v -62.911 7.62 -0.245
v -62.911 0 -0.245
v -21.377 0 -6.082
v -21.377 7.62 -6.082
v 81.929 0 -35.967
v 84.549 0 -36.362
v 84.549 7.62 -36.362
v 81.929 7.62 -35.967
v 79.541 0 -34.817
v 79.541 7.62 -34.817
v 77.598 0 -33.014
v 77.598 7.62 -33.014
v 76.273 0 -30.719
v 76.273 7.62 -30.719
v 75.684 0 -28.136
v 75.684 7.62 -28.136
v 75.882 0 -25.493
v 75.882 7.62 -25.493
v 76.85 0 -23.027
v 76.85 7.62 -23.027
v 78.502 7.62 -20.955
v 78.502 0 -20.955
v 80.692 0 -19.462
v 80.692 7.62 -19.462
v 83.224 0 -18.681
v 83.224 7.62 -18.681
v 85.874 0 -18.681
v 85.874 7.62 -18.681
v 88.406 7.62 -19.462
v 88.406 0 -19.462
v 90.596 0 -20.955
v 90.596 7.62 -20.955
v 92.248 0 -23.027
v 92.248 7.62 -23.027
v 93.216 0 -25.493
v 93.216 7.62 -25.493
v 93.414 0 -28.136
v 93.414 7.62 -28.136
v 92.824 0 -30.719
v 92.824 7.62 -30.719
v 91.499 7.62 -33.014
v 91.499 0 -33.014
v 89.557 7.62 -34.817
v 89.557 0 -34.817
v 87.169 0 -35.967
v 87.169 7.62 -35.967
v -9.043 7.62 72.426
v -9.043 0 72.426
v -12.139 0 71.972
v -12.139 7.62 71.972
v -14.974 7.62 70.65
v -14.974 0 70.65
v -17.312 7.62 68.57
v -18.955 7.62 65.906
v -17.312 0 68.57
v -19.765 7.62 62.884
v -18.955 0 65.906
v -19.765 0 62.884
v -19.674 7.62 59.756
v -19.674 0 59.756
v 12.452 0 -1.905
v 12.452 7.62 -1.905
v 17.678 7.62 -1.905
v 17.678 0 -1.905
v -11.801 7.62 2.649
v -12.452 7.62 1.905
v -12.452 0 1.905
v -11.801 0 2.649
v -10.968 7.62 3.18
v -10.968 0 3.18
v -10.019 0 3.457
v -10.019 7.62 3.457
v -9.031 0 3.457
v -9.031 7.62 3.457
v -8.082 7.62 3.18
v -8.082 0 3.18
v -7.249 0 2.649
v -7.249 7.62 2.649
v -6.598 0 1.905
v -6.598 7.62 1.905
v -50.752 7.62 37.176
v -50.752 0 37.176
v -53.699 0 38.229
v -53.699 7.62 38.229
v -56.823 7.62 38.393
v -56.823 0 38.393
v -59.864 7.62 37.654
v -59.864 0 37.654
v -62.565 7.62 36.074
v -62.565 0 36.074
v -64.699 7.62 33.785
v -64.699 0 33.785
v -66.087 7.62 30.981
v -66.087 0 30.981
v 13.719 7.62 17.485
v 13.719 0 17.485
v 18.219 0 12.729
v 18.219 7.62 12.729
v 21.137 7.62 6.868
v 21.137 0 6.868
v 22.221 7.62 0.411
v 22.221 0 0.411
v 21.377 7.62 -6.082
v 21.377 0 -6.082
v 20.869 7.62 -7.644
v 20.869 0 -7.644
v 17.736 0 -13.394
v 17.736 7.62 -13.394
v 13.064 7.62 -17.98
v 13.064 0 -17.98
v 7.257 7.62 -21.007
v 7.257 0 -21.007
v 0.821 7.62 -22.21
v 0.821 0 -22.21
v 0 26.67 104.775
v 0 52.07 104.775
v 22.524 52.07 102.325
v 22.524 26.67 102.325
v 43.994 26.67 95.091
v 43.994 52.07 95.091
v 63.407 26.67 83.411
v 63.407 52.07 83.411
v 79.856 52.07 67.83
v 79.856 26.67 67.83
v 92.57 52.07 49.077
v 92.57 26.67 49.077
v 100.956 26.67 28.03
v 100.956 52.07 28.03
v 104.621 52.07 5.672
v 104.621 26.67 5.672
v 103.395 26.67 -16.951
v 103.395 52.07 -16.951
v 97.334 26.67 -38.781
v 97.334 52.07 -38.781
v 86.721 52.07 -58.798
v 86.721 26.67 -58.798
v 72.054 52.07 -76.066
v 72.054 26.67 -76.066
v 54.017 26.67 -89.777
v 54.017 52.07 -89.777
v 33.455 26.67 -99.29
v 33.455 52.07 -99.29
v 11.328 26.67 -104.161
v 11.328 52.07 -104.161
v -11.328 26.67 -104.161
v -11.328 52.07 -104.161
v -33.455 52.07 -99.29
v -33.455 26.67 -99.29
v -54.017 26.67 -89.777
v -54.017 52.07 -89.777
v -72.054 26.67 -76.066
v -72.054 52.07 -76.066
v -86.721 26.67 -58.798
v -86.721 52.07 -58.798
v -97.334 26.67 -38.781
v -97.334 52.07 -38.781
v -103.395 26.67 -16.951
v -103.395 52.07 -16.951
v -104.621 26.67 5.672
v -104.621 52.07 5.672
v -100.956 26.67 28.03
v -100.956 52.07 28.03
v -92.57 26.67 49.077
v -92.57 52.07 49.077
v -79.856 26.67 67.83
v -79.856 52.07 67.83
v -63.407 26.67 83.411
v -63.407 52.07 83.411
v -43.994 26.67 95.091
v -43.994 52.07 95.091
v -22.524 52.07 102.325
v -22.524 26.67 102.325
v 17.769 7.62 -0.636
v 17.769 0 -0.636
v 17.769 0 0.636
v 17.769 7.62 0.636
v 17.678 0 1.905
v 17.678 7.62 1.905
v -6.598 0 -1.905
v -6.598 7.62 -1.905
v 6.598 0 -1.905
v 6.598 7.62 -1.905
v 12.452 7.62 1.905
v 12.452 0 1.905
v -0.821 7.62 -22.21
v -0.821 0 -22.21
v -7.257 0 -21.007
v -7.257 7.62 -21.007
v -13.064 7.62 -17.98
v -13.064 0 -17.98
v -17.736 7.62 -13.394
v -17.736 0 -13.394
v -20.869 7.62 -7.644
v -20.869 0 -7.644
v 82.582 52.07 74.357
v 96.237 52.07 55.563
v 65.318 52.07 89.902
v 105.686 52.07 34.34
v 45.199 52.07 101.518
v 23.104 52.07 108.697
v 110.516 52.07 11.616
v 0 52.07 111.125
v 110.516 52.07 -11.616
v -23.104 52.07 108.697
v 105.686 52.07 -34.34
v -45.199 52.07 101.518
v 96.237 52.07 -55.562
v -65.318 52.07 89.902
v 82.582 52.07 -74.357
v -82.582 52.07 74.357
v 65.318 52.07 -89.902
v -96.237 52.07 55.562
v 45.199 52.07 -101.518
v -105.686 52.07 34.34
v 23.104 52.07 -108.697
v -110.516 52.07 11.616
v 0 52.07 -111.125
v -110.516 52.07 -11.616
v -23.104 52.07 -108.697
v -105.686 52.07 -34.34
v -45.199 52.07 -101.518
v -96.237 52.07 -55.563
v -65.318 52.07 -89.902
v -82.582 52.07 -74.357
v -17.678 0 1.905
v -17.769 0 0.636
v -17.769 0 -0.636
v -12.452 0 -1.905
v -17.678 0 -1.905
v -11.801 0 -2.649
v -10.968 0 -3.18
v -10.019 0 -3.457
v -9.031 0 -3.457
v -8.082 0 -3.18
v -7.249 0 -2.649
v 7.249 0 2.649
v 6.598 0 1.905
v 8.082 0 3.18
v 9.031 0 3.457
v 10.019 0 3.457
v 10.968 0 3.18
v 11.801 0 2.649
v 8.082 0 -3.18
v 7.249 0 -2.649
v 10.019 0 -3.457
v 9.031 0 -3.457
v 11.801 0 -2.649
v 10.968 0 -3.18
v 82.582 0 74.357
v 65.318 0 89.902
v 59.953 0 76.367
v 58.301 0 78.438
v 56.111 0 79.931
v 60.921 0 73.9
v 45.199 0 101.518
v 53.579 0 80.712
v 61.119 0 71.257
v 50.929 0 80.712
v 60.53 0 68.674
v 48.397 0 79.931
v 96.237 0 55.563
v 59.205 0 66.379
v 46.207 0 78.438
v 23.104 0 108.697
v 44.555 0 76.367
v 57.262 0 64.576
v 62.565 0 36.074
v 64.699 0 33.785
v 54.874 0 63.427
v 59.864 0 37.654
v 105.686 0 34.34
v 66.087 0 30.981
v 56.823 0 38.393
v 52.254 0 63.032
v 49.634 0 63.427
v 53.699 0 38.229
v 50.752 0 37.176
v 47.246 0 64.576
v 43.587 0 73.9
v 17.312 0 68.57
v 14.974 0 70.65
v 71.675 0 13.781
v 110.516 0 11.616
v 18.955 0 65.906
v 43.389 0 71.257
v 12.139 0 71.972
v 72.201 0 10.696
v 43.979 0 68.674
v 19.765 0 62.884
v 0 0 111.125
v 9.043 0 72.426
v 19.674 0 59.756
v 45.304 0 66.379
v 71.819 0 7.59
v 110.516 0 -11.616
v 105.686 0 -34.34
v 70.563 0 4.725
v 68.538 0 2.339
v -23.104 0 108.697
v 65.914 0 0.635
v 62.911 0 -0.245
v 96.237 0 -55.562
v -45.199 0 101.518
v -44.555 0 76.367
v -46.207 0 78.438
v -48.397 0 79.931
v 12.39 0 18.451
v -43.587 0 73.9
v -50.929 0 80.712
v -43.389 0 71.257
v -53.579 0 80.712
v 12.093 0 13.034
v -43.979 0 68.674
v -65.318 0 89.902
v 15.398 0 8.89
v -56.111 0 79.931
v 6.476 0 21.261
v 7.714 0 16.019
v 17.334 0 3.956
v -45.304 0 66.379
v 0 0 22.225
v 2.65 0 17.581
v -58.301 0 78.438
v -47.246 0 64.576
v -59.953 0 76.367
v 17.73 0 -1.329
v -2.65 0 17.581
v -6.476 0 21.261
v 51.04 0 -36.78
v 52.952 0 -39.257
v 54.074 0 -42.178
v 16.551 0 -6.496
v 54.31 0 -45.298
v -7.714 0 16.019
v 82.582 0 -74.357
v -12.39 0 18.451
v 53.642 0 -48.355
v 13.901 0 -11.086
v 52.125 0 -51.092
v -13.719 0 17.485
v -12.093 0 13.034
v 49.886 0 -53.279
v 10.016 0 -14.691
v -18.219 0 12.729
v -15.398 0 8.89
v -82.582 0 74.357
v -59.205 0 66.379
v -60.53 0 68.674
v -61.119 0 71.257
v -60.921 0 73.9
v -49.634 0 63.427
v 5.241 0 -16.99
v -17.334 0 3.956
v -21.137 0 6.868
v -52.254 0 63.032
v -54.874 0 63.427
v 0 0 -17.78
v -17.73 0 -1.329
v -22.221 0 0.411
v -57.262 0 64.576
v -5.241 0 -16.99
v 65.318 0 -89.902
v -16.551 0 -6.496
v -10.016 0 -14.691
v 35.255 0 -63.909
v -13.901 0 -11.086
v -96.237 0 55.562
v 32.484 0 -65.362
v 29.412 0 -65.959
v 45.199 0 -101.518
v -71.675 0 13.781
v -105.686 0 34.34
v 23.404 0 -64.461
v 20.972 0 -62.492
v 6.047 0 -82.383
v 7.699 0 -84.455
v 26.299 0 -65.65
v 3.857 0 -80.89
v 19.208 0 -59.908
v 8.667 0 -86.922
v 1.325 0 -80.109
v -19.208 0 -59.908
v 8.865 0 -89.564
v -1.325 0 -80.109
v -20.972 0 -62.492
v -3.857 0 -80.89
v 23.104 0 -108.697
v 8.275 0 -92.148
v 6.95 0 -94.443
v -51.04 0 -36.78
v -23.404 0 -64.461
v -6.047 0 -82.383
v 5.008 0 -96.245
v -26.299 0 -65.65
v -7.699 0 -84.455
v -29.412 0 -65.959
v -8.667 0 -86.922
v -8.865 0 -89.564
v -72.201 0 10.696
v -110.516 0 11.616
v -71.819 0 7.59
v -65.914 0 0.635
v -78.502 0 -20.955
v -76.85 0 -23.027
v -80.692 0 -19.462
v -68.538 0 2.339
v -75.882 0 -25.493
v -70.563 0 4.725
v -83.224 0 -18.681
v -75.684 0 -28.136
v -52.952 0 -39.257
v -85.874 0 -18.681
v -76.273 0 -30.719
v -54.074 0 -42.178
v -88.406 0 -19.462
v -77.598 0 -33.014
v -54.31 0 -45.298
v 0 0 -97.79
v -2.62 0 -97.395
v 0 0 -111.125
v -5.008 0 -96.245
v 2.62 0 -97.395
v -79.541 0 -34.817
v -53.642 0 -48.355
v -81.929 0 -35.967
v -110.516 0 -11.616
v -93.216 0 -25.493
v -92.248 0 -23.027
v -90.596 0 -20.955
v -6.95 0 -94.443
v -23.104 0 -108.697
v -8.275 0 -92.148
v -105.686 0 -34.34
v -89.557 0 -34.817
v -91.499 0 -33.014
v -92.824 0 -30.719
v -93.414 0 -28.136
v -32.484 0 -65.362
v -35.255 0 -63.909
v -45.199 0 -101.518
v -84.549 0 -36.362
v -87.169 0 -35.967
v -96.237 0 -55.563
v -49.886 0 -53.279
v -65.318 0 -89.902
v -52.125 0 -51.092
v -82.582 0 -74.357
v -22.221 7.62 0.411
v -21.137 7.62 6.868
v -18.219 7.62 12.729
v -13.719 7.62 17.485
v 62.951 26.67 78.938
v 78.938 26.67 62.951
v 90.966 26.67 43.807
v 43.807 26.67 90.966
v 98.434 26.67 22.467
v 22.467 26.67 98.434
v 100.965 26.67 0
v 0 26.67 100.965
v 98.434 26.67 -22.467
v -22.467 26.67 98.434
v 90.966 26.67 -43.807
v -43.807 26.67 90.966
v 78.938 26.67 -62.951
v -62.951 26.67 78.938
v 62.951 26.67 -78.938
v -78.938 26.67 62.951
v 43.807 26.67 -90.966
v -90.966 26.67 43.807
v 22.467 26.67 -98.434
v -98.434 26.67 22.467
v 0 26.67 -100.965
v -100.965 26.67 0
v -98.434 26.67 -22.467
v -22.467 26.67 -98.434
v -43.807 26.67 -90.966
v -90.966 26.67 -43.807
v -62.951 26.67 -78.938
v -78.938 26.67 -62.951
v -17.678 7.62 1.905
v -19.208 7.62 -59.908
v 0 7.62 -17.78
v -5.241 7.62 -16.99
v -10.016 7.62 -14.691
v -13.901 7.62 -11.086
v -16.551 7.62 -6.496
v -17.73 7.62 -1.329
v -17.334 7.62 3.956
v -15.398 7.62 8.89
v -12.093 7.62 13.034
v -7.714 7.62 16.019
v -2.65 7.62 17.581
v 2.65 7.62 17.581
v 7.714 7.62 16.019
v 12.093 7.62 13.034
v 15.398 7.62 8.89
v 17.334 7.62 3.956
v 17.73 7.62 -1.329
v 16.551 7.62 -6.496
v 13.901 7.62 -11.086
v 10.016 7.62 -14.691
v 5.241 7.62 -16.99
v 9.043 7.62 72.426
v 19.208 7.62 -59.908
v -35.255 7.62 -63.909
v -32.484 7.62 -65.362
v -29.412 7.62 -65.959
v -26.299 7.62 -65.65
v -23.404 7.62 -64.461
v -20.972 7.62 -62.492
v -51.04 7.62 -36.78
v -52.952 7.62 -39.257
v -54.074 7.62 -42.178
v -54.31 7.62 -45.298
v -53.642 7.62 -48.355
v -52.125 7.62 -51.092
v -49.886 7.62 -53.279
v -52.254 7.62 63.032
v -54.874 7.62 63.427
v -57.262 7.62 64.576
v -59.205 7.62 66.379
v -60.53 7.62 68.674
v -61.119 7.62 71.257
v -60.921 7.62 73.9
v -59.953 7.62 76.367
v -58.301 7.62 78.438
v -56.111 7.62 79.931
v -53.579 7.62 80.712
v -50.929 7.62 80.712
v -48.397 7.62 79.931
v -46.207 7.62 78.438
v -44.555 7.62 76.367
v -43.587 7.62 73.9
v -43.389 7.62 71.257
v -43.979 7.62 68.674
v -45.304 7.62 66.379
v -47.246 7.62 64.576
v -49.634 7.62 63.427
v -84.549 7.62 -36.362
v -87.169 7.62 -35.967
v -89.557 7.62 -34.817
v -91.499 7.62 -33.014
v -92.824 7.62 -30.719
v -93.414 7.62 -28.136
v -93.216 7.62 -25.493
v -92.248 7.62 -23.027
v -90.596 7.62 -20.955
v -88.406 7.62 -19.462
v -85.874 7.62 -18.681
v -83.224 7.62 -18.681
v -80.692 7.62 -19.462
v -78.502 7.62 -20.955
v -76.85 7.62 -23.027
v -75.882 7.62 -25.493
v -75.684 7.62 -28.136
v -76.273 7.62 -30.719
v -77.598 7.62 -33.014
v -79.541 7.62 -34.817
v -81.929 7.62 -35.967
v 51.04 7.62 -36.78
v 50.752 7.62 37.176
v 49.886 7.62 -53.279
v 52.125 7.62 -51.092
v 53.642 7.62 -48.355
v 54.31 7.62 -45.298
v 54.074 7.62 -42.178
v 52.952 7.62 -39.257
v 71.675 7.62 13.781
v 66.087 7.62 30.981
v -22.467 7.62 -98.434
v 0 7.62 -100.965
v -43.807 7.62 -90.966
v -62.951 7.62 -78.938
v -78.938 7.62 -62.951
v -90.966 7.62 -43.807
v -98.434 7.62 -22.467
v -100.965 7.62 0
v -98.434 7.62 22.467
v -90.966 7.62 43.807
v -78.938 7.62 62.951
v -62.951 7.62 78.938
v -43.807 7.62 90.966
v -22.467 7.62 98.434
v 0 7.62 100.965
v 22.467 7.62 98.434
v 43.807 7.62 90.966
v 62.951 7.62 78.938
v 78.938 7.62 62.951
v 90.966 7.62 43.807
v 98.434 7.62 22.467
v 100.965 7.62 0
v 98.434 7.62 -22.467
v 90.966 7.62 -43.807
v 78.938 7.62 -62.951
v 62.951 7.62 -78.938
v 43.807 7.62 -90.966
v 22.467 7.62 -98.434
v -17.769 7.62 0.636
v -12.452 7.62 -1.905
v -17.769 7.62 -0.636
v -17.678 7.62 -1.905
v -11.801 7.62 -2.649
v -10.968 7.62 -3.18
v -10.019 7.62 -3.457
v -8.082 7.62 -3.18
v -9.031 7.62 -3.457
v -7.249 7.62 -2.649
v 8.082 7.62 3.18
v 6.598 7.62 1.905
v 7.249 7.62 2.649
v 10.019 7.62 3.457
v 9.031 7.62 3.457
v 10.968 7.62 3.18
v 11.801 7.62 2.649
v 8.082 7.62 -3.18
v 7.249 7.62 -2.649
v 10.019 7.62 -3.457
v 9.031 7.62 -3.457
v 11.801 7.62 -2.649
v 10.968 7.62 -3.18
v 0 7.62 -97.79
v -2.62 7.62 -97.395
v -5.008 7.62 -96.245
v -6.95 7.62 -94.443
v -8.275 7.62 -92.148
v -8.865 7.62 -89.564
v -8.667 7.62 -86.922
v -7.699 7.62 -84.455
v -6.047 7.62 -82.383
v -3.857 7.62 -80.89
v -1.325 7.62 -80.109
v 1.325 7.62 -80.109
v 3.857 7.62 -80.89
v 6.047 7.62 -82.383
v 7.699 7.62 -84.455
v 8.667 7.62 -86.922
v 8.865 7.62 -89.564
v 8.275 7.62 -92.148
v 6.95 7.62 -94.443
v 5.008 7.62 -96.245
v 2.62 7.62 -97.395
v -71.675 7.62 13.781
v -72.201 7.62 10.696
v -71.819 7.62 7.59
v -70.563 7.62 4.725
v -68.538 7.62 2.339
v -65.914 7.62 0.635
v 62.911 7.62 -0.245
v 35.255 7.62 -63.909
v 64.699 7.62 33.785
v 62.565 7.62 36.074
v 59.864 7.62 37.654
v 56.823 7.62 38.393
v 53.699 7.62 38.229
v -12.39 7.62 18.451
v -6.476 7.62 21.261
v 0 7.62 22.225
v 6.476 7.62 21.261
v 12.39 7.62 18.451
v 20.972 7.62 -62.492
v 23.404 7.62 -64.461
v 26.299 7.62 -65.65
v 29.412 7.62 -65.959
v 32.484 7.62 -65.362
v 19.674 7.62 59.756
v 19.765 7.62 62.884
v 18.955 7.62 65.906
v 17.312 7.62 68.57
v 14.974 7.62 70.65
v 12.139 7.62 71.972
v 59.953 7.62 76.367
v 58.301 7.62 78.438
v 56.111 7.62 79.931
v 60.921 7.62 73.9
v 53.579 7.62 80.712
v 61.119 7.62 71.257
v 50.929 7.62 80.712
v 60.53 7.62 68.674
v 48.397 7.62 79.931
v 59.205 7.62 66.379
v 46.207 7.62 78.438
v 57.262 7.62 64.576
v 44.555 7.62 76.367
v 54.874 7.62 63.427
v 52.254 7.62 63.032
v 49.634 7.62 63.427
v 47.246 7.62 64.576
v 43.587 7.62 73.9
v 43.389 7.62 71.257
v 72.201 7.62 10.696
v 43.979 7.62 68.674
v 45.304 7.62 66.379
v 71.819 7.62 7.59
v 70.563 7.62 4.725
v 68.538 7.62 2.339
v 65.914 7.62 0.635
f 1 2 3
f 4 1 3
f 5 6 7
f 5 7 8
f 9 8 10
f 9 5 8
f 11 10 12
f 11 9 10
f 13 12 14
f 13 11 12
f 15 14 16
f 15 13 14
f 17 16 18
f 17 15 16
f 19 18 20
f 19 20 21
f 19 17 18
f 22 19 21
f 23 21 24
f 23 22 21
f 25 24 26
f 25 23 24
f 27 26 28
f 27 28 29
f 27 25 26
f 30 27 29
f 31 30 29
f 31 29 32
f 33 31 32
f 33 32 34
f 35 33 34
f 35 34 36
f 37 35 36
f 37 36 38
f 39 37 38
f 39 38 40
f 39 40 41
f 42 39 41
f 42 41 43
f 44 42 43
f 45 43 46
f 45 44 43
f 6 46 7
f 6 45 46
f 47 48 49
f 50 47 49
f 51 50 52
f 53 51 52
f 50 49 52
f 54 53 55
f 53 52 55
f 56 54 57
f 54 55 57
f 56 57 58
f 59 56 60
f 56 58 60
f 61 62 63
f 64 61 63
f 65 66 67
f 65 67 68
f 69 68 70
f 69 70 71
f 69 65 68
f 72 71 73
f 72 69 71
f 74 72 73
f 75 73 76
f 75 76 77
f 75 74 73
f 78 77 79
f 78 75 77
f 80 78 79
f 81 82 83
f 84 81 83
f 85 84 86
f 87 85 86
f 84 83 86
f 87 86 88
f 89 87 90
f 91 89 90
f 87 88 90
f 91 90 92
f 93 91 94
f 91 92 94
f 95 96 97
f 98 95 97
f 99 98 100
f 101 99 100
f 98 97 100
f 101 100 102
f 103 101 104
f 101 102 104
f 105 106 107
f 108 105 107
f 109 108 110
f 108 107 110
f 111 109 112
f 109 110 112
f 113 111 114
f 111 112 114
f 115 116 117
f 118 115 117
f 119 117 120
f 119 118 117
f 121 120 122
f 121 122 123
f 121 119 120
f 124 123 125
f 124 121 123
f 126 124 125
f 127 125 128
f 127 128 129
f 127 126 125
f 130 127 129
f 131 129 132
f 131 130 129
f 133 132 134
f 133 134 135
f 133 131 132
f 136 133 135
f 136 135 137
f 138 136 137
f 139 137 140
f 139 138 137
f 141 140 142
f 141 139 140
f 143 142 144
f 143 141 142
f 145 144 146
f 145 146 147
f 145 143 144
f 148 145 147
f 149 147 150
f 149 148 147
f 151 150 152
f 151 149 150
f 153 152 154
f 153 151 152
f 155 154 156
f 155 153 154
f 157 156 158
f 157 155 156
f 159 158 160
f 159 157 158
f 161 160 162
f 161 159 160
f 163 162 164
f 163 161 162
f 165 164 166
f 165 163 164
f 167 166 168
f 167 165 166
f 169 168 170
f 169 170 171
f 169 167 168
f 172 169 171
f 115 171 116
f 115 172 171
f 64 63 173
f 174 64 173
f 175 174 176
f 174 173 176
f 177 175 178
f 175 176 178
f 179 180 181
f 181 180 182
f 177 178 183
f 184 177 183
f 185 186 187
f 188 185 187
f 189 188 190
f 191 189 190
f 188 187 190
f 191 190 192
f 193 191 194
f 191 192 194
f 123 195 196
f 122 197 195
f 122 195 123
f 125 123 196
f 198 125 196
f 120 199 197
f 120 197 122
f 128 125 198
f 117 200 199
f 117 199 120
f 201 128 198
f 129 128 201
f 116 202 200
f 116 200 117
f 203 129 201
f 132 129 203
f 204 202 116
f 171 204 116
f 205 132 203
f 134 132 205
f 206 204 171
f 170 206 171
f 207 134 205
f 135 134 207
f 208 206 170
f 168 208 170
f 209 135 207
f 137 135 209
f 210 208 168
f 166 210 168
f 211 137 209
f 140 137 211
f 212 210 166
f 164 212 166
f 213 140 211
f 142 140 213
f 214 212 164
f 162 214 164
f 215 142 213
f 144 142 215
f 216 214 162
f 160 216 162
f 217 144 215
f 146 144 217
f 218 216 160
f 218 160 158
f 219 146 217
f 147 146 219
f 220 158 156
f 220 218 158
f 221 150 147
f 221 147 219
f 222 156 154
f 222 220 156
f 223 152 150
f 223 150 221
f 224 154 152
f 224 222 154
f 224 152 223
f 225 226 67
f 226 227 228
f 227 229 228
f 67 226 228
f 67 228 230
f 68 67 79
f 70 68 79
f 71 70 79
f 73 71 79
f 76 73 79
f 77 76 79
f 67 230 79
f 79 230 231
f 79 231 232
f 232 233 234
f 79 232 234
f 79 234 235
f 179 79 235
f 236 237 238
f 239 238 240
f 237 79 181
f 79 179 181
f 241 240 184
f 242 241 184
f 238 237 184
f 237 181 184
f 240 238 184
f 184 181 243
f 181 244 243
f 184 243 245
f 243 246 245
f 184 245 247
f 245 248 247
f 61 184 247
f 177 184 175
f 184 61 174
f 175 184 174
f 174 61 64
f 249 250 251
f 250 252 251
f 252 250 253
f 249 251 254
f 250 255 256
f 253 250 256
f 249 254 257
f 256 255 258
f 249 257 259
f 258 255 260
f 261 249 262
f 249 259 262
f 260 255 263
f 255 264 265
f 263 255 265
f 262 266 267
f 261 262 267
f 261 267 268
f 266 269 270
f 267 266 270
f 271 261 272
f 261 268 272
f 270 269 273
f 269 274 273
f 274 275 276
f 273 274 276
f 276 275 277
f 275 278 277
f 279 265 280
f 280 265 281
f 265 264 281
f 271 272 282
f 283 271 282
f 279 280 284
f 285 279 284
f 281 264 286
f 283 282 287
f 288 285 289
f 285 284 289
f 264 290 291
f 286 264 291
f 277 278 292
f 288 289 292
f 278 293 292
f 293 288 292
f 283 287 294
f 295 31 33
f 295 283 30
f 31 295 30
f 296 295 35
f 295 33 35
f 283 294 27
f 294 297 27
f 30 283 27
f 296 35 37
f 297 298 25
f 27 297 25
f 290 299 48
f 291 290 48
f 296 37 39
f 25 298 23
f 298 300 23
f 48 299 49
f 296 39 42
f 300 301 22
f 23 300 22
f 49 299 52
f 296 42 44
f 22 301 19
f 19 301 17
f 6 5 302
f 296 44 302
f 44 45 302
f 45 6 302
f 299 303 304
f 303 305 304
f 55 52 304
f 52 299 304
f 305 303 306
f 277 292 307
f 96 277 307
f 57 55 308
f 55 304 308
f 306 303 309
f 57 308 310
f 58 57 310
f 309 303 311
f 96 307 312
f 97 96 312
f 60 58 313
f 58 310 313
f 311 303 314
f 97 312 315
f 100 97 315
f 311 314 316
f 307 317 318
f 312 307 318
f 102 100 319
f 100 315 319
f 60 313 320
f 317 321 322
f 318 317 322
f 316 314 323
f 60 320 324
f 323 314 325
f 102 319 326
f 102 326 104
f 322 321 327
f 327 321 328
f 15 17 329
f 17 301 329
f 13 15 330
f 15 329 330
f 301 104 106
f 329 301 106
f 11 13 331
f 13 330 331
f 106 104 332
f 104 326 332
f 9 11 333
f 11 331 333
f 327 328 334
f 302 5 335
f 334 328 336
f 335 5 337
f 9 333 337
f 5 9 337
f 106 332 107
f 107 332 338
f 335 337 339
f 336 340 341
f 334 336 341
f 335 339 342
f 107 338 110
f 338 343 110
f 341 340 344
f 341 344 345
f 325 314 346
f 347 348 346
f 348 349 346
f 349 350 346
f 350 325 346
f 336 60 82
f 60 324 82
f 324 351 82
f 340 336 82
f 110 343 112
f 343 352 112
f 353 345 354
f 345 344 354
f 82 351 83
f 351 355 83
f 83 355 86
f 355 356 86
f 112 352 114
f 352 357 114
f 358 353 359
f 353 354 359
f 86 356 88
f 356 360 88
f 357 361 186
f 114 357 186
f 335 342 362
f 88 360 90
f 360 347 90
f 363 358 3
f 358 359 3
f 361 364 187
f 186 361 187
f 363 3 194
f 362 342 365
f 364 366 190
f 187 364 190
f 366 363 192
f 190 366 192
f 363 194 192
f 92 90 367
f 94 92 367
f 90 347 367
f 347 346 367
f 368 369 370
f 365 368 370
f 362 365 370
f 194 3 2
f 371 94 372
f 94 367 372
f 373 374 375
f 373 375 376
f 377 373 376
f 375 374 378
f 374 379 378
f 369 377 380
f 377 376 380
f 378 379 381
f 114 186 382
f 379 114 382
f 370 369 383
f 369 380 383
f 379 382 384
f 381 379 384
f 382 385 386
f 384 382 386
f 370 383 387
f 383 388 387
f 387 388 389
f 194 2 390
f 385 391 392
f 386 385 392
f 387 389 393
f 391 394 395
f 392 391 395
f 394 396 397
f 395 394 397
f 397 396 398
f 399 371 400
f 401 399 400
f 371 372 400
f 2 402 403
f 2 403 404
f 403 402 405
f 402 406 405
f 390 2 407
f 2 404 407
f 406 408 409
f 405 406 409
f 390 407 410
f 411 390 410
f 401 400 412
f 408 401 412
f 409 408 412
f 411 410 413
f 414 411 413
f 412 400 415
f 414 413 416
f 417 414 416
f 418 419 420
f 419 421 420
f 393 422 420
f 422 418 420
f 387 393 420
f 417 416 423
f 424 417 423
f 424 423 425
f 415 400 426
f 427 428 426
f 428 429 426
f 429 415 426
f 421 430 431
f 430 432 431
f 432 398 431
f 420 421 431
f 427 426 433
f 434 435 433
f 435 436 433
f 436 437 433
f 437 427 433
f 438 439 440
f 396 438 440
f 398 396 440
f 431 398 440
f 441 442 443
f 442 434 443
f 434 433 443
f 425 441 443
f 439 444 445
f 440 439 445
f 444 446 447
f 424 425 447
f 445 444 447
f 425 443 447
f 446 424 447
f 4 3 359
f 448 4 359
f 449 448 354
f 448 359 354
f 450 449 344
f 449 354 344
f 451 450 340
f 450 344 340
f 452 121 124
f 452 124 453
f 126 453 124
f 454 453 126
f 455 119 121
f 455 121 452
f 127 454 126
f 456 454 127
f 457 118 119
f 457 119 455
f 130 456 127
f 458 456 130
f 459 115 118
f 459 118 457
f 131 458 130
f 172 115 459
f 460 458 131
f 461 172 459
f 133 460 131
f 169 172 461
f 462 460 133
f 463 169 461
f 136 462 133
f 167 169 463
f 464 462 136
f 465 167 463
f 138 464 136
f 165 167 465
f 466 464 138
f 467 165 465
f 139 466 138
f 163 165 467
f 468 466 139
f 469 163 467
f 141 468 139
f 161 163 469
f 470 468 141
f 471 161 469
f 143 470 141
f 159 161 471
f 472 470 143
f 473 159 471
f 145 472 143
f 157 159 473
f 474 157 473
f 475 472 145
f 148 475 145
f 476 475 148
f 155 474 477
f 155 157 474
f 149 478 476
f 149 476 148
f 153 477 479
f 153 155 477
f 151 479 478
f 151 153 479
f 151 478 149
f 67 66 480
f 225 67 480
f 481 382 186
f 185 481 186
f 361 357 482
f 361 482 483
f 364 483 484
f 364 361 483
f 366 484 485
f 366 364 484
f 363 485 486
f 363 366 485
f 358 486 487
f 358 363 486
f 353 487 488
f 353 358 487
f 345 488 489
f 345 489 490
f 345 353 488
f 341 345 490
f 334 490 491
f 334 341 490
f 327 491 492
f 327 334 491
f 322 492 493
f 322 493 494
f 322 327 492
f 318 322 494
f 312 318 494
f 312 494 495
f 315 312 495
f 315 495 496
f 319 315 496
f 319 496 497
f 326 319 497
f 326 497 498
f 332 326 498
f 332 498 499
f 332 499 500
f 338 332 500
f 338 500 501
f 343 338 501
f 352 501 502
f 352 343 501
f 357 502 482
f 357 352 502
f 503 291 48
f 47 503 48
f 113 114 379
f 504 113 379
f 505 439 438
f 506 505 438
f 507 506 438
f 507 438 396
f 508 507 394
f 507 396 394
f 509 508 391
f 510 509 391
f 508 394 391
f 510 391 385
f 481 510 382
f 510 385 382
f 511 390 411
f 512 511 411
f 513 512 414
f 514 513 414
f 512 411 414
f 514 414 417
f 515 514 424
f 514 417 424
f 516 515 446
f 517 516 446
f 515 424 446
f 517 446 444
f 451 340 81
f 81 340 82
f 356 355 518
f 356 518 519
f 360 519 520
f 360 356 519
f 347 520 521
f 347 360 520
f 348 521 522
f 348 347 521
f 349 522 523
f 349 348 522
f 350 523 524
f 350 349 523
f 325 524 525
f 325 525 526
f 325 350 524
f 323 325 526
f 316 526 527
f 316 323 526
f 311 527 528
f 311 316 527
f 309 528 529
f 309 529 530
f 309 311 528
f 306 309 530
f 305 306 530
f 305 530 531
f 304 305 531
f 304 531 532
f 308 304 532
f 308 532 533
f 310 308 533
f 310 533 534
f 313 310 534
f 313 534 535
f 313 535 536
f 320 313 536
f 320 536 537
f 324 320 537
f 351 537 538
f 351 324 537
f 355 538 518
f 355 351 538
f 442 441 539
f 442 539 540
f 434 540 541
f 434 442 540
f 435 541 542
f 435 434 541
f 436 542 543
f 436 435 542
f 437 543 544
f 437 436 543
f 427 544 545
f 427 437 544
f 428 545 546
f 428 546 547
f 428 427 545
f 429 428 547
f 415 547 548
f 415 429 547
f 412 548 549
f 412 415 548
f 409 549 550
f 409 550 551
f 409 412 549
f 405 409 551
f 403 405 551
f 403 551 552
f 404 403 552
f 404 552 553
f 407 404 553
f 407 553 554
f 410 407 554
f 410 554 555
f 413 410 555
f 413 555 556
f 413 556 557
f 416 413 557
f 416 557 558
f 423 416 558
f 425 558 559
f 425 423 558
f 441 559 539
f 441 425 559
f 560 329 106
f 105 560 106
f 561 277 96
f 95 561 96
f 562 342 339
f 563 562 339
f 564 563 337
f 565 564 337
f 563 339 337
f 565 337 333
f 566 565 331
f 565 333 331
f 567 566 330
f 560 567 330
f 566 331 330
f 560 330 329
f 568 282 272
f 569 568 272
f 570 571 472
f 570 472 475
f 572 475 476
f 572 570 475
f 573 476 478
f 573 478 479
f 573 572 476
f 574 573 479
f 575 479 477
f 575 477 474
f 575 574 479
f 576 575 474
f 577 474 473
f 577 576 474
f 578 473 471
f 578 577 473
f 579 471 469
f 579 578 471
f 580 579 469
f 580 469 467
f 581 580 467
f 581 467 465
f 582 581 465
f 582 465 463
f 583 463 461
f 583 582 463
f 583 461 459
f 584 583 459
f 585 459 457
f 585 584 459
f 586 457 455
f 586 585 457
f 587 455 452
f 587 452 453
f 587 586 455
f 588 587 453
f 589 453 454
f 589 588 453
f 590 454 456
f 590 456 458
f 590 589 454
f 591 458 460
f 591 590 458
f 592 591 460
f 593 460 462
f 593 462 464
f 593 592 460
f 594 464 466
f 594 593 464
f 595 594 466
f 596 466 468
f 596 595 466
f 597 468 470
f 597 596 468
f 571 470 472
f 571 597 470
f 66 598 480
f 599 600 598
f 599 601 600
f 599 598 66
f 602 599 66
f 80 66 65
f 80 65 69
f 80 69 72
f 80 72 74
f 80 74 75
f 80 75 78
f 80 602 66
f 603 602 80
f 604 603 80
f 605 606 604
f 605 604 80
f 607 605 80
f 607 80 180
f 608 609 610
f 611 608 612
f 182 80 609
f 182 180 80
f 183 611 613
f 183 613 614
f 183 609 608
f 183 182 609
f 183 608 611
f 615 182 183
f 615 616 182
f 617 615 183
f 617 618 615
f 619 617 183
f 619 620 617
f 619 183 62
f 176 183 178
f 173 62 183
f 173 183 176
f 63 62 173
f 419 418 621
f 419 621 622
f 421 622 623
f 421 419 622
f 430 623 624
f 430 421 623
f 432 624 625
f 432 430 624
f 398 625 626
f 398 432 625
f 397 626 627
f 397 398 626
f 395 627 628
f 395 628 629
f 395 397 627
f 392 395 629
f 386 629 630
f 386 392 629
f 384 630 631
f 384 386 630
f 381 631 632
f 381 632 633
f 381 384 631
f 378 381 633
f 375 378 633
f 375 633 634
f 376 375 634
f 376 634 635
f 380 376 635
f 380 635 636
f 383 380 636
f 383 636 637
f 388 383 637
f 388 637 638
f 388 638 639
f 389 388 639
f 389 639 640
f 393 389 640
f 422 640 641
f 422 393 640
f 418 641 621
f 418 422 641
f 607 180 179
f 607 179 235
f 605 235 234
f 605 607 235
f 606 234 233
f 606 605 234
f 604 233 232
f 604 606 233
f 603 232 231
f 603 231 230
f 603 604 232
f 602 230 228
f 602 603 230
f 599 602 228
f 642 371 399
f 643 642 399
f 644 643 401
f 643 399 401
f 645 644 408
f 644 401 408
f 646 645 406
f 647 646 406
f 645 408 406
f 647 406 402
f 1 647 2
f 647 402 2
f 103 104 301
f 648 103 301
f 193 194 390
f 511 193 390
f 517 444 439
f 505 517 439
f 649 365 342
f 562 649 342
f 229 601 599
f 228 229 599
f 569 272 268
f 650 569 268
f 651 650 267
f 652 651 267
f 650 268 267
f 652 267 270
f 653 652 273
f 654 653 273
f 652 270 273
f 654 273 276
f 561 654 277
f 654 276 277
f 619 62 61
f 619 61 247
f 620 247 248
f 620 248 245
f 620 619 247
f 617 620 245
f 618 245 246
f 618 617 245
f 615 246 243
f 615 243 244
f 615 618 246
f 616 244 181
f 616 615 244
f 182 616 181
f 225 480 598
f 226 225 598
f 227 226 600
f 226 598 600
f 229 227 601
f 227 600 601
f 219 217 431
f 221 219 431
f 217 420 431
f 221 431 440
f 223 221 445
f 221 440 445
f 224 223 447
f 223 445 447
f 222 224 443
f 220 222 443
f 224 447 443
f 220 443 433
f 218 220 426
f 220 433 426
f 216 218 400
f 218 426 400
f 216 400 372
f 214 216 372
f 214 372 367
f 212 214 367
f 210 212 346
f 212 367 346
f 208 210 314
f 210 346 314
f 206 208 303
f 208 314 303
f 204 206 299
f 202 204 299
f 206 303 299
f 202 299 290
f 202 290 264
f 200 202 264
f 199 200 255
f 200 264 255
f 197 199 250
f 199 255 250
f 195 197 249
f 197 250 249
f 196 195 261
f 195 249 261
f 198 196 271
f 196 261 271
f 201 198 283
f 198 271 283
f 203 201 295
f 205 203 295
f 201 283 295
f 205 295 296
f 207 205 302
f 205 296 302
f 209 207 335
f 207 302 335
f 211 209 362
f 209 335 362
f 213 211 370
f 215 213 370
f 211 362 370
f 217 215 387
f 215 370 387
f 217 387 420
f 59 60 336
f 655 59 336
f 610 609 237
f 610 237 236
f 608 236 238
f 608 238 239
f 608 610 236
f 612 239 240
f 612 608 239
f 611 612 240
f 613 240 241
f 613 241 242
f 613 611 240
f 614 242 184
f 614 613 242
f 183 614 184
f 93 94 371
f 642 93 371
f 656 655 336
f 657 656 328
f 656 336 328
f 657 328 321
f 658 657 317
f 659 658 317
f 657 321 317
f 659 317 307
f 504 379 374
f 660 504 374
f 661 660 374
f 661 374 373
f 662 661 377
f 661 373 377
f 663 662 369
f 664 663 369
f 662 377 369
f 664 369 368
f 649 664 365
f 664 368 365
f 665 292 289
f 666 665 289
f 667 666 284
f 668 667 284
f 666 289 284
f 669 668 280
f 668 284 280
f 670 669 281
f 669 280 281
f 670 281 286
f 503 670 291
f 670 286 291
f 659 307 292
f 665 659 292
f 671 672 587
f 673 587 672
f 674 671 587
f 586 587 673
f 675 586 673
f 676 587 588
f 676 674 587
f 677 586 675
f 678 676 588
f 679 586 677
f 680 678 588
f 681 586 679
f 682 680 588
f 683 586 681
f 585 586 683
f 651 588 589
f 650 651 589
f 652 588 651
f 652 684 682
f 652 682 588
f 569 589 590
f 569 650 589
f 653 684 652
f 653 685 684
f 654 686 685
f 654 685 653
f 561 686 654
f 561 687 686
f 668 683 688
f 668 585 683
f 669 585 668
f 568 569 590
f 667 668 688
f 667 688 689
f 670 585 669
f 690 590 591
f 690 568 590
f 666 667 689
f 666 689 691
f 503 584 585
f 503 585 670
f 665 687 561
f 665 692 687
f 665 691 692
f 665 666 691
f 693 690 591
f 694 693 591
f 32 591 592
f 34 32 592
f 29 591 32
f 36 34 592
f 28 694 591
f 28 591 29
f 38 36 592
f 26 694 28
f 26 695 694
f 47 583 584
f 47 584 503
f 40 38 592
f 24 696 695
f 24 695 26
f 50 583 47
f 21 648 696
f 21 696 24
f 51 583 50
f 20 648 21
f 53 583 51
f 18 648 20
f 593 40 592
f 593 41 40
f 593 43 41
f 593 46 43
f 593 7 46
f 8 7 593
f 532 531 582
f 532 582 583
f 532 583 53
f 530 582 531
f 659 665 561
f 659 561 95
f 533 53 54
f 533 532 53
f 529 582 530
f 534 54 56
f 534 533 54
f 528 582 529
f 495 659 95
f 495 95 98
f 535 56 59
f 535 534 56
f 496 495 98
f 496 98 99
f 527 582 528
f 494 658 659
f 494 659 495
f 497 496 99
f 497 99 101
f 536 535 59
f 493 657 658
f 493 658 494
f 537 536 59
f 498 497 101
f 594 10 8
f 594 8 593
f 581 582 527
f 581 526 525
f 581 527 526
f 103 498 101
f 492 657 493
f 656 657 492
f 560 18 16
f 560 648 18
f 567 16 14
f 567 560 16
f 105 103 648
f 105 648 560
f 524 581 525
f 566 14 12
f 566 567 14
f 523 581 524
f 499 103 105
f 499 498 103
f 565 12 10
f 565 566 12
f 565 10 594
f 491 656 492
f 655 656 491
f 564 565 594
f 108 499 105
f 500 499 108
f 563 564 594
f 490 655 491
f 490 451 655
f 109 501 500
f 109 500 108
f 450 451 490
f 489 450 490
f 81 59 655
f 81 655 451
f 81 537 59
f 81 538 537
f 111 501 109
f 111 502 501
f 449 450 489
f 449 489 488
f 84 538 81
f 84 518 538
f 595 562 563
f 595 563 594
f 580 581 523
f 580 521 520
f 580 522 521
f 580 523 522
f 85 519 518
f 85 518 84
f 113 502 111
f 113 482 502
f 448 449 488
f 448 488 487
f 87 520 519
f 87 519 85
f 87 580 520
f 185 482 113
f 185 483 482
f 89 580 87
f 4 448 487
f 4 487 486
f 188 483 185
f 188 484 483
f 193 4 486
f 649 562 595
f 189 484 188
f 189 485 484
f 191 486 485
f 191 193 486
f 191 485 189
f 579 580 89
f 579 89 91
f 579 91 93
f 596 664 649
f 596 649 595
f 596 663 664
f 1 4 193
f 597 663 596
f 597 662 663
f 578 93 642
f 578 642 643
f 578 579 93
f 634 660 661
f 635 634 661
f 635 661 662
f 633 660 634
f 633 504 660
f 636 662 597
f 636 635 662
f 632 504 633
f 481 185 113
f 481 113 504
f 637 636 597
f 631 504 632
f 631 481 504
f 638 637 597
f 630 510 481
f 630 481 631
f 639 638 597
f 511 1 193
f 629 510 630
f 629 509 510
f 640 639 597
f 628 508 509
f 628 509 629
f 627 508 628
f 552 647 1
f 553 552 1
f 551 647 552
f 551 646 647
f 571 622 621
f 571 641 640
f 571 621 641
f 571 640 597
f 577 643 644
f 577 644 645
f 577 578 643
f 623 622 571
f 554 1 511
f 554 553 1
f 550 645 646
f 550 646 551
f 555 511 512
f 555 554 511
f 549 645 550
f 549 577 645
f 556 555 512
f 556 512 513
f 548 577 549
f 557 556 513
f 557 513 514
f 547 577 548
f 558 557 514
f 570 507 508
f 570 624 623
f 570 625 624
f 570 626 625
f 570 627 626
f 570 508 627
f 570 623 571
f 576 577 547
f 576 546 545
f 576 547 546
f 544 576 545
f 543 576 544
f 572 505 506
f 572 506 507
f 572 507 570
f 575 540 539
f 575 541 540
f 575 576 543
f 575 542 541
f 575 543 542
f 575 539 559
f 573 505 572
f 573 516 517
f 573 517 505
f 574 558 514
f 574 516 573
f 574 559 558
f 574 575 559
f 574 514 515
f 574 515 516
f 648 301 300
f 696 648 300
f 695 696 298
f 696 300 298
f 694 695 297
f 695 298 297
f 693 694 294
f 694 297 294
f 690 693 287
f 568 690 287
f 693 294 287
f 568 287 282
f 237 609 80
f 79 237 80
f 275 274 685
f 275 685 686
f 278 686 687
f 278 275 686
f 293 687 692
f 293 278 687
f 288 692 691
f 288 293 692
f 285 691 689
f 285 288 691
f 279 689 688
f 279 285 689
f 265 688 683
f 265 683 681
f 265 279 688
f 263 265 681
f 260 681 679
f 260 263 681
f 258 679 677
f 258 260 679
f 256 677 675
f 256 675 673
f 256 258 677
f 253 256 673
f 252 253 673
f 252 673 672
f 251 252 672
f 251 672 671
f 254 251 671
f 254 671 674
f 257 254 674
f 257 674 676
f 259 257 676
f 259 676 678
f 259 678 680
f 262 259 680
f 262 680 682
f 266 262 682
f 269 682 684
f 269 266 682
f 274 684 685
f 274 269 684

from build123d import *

# Parameters (mm, degrees)
SKETCH1_R           = 111.125
SKETCH1_R_2         = 17.78
SKETCH1_R_3         = 8.89
BOSS_EXTRUDE1_DEPTH = 7.62
SKETCH3_R           = 111.125
SKETCH3_R_2         = 100.965
BOSS_EXTRUDE2_DEPTH = 19.05
SKETCH5_R           = 111.125
SKETCH5_R_2         = 104.775
BOSS_EXTRUDE3_DEPTH = 25.4
SKETCH6_R           = 3.4925
BOSS_EXTRUDE4_DEPTH = 7.62


with BuildPart() as part:
    # Sketch1 → Boss-Extrude1 (new body)
    with BuildSketch(Plane(origin=(0, 0, 0), x_dir=(1, 0, 0), z_dir=(0, 1, 0))):
        with Locations(Location((0, 0, 0), (0, 0, 90))):
            Circle(SKETCH1_R)
        with BuildLine():
            ThreePointArc((-12.390251216, -18.450807565), (0, -22.225), (12.390251216, -18.450807565))
            Line((12.390251216, -18.450807565), (19.673519662, -59.756275487))
            ThreePointArc((19.673519662, -59.756275487), (17.311969731, -68.569699811), (9.042519968, -72.425807565))
            Line((9.042519968, -72.425807565), (-9.042519968, -72.425807565))
            ThreePointArc((-9.042519968, -72.425807565), (-17.311969731, -68.569699811), (-19.673519662, -59.756275487))
            Line((-19.673519662, -59.756275487), (-12.390251216, -18.450807565))
        make_face(mode=Mode.SUBTRACT)
        with BuildLine():
            ThreePointArc((-21.376558956, 6.08221606), (-21.137231075, -6.8679027), (-13.718962575, -17.485442255))
            Line((-13.718962575, -17.485442255), (-50.752143277, -37.176333719))
            ThreePointArc((-50.752143277, -37.176333719), (-59.863966973, -37.653864164), (-66.08674389, -30.980752908))
            Line((-66.08674389, -30.980752908), (-71.675328575, -13.78085783))
            ThreePointArc((-71.675328575, -13.78085783), (-70.563352679, -4.724540918), (-62.911047106, 0.244924427))
            Line((-62.911047106, 0.244924427), (-21.376558956, 6.08221606))
        make_face(mode=Mode.SUBTRACT)
        with BuildLine():
            ThreePointArc((-0.821188781, 22.209823817), (-13.063527232, 17.9804027), (-20.869036378, 7.644209943))
            Line((-20.869036378, 7.644209943), (-51.040069209, 36.780037672))
            ThreePointArc((-51.040069209, 36.780037672), (-54.309936022, 45.29833195), (-49.886373898, 53.278649271))
            Line((-49.886373898, 53.278649271), (-35.255269246, 63.908769032))
            ThreePointArc((-35.255269246, 63.908769032), (-26.298580584, 65.649772943), (-19.207645718, 59.907647107))
            Line((-19.207645718, 59.907647107), (-0.821188781, 22.209823817))
        make_face(mode=Mode.SUBTRACT)
        with BuildLine():
            ThreePointArc((20.869036378, 7.644209943), (13.063527232, 17.9804027), (0.821188781, 22.209823817))
            Line((0.821188781, 22.209823817), (19.207645718, 59.907647107))
            ThreePointArc((19.207645718, 59.907647107), (26.298580584, 65.649772943), (35.255269246, 63.908769032))
            Line((35.255269246, 63.908769032), (49.886373898, 53.278649271))
            ThreePointArc((49.886373898, 53.278649271), (54.309936022, 45.29833195), (51.040069209, 36.780037672))
            Line((51.040069209, 36.780037672), (20.869036378, 7.644209943))
        make_face(mode=Mode.SUBTRACT)
        with BuildLine():
            Line((21.376558956, 6.08221606), (62.911047106, 0.244924427))
            ThreePointArc((62.911047106, 0.244924427), (70.563352679, -4.724540918), (71.675328575, -13.78085783))
            Line((71.675328575, -13.78085783), (66.08674389, -30.980752908))
            ThreePointArc((66.08674389, -30.980752908), (59.863966973, -37.653864164), (50.752143277, -37.176333719))
            Line((50.752143277, -37.176333719), (13.718962575, -17.485442255))
            ThreePointArc((13.718962575, -17.485442255), (21.137231075, -6.8679027), (21.376558956, 6.08221606))
        make_face(mode=Mode.SUBTRACT)
        with Locations(Location((0, 0, 0), (0, 0, 90))):
            Circle(SKETCH1_R_2, mode=Mode.SUBTRACT)
        with Locations(Location((-52.254108929, -71.9216108, 0), (0, 0, 90))):
            Circle(SKETCH1_R_3, mode=Mode.SUBTRACT)
        with Locations(Location((52.254108929, -71.9216108, 0), (0, 0, 90))):
            Circle(SKETCH1_R_3, mode=Mode.SUBTRACT)
        with Locations(Location((-84.548924299, 27.4716108, 0), (0, 0, 90))):
            Circle(SKETCH1_R_3, mode=Mode.SUBTRACT)
        with Locations(Location((84.548924299, 27.4716108, 0), (0, 0, 90))):
            Circle(SKETCH1_R_3, mode=Mode.SUBTRACT)
        with Locations(Location((0, 88.9, 0), (0, 0, 90))):
            Circle(SKETCH1_R_3, mode=Mode.SUBTRACT)
    extrude(amount=BOSS_EXTRUDE1_DEPTH)

    # Sketch3 → Boss-Extrude2 (add)
    with BuildSketch(Plane(origin=(0, 7.62, 0), x_dir=(1, 0, 0), z_dir=(0, 1, 0))):
        with Locations(Location((0, 0, 0), (0, 0, 90))):
            Circle(SKETCH3_R)
        with Locations(Location((0, 0, 0), (0, 0, 90))):
            Circle(SKETCH3_R_2, mode=Mode.SUBTRACT)
    extrude(amount=BOSS_EXTRUDE2_DEPTH)

    # Sketch5 → Boss-Extrude3 (add)
    with BuildSketch(Plane(origin=(0, 26.67, 0), x_dir=(1, 0, 0), z_dir=(0, 1, 0))):
        with Locations(Location((0, 0, 0), (0, 0, 90))):
            Circle(SKETCH5_R)
        with Locations(Location((0, 0, 0), (0, 0, 270))):
            Circle(SKETCH5_R_2, mode=Mode.SUBTRACT)
    extrude(amount=BOSS_EXTRUDE3_DEPTH)


with BuildPart() as body_2:
    # Sketch6 → Boss-Extrude4 (new body)
    with BuildSketch(Plane(origin=(0, 7.62, 0), x_dir=(1, 0, 0), z_dir=(0, 1, 0))):
        with Locations((9.525, 0)):
            Circle(SKETCH6_R)
        with Locations((-9.525, 0)):
            Circle(SKETCH6_R)
        with BuildLine():
            Line((-17.677651852, 1.905), (17.677651852, 1.905))
            ThreePointArc((17.677651852, 1.905), (17.78, 0), (17.677651852, -1.905))
            Line((17.677651852, -1.905), (-17.677651852, -1.905))
            ThreePointArc((-17.677651852, -1.905), (-17.78, 0), (-17.677651852, 1.905))
        make_face()
    extrude(amount=-BOSS_EXTRUDE4_DEPTH)


solid = Compound([part.part, body_2.part])
